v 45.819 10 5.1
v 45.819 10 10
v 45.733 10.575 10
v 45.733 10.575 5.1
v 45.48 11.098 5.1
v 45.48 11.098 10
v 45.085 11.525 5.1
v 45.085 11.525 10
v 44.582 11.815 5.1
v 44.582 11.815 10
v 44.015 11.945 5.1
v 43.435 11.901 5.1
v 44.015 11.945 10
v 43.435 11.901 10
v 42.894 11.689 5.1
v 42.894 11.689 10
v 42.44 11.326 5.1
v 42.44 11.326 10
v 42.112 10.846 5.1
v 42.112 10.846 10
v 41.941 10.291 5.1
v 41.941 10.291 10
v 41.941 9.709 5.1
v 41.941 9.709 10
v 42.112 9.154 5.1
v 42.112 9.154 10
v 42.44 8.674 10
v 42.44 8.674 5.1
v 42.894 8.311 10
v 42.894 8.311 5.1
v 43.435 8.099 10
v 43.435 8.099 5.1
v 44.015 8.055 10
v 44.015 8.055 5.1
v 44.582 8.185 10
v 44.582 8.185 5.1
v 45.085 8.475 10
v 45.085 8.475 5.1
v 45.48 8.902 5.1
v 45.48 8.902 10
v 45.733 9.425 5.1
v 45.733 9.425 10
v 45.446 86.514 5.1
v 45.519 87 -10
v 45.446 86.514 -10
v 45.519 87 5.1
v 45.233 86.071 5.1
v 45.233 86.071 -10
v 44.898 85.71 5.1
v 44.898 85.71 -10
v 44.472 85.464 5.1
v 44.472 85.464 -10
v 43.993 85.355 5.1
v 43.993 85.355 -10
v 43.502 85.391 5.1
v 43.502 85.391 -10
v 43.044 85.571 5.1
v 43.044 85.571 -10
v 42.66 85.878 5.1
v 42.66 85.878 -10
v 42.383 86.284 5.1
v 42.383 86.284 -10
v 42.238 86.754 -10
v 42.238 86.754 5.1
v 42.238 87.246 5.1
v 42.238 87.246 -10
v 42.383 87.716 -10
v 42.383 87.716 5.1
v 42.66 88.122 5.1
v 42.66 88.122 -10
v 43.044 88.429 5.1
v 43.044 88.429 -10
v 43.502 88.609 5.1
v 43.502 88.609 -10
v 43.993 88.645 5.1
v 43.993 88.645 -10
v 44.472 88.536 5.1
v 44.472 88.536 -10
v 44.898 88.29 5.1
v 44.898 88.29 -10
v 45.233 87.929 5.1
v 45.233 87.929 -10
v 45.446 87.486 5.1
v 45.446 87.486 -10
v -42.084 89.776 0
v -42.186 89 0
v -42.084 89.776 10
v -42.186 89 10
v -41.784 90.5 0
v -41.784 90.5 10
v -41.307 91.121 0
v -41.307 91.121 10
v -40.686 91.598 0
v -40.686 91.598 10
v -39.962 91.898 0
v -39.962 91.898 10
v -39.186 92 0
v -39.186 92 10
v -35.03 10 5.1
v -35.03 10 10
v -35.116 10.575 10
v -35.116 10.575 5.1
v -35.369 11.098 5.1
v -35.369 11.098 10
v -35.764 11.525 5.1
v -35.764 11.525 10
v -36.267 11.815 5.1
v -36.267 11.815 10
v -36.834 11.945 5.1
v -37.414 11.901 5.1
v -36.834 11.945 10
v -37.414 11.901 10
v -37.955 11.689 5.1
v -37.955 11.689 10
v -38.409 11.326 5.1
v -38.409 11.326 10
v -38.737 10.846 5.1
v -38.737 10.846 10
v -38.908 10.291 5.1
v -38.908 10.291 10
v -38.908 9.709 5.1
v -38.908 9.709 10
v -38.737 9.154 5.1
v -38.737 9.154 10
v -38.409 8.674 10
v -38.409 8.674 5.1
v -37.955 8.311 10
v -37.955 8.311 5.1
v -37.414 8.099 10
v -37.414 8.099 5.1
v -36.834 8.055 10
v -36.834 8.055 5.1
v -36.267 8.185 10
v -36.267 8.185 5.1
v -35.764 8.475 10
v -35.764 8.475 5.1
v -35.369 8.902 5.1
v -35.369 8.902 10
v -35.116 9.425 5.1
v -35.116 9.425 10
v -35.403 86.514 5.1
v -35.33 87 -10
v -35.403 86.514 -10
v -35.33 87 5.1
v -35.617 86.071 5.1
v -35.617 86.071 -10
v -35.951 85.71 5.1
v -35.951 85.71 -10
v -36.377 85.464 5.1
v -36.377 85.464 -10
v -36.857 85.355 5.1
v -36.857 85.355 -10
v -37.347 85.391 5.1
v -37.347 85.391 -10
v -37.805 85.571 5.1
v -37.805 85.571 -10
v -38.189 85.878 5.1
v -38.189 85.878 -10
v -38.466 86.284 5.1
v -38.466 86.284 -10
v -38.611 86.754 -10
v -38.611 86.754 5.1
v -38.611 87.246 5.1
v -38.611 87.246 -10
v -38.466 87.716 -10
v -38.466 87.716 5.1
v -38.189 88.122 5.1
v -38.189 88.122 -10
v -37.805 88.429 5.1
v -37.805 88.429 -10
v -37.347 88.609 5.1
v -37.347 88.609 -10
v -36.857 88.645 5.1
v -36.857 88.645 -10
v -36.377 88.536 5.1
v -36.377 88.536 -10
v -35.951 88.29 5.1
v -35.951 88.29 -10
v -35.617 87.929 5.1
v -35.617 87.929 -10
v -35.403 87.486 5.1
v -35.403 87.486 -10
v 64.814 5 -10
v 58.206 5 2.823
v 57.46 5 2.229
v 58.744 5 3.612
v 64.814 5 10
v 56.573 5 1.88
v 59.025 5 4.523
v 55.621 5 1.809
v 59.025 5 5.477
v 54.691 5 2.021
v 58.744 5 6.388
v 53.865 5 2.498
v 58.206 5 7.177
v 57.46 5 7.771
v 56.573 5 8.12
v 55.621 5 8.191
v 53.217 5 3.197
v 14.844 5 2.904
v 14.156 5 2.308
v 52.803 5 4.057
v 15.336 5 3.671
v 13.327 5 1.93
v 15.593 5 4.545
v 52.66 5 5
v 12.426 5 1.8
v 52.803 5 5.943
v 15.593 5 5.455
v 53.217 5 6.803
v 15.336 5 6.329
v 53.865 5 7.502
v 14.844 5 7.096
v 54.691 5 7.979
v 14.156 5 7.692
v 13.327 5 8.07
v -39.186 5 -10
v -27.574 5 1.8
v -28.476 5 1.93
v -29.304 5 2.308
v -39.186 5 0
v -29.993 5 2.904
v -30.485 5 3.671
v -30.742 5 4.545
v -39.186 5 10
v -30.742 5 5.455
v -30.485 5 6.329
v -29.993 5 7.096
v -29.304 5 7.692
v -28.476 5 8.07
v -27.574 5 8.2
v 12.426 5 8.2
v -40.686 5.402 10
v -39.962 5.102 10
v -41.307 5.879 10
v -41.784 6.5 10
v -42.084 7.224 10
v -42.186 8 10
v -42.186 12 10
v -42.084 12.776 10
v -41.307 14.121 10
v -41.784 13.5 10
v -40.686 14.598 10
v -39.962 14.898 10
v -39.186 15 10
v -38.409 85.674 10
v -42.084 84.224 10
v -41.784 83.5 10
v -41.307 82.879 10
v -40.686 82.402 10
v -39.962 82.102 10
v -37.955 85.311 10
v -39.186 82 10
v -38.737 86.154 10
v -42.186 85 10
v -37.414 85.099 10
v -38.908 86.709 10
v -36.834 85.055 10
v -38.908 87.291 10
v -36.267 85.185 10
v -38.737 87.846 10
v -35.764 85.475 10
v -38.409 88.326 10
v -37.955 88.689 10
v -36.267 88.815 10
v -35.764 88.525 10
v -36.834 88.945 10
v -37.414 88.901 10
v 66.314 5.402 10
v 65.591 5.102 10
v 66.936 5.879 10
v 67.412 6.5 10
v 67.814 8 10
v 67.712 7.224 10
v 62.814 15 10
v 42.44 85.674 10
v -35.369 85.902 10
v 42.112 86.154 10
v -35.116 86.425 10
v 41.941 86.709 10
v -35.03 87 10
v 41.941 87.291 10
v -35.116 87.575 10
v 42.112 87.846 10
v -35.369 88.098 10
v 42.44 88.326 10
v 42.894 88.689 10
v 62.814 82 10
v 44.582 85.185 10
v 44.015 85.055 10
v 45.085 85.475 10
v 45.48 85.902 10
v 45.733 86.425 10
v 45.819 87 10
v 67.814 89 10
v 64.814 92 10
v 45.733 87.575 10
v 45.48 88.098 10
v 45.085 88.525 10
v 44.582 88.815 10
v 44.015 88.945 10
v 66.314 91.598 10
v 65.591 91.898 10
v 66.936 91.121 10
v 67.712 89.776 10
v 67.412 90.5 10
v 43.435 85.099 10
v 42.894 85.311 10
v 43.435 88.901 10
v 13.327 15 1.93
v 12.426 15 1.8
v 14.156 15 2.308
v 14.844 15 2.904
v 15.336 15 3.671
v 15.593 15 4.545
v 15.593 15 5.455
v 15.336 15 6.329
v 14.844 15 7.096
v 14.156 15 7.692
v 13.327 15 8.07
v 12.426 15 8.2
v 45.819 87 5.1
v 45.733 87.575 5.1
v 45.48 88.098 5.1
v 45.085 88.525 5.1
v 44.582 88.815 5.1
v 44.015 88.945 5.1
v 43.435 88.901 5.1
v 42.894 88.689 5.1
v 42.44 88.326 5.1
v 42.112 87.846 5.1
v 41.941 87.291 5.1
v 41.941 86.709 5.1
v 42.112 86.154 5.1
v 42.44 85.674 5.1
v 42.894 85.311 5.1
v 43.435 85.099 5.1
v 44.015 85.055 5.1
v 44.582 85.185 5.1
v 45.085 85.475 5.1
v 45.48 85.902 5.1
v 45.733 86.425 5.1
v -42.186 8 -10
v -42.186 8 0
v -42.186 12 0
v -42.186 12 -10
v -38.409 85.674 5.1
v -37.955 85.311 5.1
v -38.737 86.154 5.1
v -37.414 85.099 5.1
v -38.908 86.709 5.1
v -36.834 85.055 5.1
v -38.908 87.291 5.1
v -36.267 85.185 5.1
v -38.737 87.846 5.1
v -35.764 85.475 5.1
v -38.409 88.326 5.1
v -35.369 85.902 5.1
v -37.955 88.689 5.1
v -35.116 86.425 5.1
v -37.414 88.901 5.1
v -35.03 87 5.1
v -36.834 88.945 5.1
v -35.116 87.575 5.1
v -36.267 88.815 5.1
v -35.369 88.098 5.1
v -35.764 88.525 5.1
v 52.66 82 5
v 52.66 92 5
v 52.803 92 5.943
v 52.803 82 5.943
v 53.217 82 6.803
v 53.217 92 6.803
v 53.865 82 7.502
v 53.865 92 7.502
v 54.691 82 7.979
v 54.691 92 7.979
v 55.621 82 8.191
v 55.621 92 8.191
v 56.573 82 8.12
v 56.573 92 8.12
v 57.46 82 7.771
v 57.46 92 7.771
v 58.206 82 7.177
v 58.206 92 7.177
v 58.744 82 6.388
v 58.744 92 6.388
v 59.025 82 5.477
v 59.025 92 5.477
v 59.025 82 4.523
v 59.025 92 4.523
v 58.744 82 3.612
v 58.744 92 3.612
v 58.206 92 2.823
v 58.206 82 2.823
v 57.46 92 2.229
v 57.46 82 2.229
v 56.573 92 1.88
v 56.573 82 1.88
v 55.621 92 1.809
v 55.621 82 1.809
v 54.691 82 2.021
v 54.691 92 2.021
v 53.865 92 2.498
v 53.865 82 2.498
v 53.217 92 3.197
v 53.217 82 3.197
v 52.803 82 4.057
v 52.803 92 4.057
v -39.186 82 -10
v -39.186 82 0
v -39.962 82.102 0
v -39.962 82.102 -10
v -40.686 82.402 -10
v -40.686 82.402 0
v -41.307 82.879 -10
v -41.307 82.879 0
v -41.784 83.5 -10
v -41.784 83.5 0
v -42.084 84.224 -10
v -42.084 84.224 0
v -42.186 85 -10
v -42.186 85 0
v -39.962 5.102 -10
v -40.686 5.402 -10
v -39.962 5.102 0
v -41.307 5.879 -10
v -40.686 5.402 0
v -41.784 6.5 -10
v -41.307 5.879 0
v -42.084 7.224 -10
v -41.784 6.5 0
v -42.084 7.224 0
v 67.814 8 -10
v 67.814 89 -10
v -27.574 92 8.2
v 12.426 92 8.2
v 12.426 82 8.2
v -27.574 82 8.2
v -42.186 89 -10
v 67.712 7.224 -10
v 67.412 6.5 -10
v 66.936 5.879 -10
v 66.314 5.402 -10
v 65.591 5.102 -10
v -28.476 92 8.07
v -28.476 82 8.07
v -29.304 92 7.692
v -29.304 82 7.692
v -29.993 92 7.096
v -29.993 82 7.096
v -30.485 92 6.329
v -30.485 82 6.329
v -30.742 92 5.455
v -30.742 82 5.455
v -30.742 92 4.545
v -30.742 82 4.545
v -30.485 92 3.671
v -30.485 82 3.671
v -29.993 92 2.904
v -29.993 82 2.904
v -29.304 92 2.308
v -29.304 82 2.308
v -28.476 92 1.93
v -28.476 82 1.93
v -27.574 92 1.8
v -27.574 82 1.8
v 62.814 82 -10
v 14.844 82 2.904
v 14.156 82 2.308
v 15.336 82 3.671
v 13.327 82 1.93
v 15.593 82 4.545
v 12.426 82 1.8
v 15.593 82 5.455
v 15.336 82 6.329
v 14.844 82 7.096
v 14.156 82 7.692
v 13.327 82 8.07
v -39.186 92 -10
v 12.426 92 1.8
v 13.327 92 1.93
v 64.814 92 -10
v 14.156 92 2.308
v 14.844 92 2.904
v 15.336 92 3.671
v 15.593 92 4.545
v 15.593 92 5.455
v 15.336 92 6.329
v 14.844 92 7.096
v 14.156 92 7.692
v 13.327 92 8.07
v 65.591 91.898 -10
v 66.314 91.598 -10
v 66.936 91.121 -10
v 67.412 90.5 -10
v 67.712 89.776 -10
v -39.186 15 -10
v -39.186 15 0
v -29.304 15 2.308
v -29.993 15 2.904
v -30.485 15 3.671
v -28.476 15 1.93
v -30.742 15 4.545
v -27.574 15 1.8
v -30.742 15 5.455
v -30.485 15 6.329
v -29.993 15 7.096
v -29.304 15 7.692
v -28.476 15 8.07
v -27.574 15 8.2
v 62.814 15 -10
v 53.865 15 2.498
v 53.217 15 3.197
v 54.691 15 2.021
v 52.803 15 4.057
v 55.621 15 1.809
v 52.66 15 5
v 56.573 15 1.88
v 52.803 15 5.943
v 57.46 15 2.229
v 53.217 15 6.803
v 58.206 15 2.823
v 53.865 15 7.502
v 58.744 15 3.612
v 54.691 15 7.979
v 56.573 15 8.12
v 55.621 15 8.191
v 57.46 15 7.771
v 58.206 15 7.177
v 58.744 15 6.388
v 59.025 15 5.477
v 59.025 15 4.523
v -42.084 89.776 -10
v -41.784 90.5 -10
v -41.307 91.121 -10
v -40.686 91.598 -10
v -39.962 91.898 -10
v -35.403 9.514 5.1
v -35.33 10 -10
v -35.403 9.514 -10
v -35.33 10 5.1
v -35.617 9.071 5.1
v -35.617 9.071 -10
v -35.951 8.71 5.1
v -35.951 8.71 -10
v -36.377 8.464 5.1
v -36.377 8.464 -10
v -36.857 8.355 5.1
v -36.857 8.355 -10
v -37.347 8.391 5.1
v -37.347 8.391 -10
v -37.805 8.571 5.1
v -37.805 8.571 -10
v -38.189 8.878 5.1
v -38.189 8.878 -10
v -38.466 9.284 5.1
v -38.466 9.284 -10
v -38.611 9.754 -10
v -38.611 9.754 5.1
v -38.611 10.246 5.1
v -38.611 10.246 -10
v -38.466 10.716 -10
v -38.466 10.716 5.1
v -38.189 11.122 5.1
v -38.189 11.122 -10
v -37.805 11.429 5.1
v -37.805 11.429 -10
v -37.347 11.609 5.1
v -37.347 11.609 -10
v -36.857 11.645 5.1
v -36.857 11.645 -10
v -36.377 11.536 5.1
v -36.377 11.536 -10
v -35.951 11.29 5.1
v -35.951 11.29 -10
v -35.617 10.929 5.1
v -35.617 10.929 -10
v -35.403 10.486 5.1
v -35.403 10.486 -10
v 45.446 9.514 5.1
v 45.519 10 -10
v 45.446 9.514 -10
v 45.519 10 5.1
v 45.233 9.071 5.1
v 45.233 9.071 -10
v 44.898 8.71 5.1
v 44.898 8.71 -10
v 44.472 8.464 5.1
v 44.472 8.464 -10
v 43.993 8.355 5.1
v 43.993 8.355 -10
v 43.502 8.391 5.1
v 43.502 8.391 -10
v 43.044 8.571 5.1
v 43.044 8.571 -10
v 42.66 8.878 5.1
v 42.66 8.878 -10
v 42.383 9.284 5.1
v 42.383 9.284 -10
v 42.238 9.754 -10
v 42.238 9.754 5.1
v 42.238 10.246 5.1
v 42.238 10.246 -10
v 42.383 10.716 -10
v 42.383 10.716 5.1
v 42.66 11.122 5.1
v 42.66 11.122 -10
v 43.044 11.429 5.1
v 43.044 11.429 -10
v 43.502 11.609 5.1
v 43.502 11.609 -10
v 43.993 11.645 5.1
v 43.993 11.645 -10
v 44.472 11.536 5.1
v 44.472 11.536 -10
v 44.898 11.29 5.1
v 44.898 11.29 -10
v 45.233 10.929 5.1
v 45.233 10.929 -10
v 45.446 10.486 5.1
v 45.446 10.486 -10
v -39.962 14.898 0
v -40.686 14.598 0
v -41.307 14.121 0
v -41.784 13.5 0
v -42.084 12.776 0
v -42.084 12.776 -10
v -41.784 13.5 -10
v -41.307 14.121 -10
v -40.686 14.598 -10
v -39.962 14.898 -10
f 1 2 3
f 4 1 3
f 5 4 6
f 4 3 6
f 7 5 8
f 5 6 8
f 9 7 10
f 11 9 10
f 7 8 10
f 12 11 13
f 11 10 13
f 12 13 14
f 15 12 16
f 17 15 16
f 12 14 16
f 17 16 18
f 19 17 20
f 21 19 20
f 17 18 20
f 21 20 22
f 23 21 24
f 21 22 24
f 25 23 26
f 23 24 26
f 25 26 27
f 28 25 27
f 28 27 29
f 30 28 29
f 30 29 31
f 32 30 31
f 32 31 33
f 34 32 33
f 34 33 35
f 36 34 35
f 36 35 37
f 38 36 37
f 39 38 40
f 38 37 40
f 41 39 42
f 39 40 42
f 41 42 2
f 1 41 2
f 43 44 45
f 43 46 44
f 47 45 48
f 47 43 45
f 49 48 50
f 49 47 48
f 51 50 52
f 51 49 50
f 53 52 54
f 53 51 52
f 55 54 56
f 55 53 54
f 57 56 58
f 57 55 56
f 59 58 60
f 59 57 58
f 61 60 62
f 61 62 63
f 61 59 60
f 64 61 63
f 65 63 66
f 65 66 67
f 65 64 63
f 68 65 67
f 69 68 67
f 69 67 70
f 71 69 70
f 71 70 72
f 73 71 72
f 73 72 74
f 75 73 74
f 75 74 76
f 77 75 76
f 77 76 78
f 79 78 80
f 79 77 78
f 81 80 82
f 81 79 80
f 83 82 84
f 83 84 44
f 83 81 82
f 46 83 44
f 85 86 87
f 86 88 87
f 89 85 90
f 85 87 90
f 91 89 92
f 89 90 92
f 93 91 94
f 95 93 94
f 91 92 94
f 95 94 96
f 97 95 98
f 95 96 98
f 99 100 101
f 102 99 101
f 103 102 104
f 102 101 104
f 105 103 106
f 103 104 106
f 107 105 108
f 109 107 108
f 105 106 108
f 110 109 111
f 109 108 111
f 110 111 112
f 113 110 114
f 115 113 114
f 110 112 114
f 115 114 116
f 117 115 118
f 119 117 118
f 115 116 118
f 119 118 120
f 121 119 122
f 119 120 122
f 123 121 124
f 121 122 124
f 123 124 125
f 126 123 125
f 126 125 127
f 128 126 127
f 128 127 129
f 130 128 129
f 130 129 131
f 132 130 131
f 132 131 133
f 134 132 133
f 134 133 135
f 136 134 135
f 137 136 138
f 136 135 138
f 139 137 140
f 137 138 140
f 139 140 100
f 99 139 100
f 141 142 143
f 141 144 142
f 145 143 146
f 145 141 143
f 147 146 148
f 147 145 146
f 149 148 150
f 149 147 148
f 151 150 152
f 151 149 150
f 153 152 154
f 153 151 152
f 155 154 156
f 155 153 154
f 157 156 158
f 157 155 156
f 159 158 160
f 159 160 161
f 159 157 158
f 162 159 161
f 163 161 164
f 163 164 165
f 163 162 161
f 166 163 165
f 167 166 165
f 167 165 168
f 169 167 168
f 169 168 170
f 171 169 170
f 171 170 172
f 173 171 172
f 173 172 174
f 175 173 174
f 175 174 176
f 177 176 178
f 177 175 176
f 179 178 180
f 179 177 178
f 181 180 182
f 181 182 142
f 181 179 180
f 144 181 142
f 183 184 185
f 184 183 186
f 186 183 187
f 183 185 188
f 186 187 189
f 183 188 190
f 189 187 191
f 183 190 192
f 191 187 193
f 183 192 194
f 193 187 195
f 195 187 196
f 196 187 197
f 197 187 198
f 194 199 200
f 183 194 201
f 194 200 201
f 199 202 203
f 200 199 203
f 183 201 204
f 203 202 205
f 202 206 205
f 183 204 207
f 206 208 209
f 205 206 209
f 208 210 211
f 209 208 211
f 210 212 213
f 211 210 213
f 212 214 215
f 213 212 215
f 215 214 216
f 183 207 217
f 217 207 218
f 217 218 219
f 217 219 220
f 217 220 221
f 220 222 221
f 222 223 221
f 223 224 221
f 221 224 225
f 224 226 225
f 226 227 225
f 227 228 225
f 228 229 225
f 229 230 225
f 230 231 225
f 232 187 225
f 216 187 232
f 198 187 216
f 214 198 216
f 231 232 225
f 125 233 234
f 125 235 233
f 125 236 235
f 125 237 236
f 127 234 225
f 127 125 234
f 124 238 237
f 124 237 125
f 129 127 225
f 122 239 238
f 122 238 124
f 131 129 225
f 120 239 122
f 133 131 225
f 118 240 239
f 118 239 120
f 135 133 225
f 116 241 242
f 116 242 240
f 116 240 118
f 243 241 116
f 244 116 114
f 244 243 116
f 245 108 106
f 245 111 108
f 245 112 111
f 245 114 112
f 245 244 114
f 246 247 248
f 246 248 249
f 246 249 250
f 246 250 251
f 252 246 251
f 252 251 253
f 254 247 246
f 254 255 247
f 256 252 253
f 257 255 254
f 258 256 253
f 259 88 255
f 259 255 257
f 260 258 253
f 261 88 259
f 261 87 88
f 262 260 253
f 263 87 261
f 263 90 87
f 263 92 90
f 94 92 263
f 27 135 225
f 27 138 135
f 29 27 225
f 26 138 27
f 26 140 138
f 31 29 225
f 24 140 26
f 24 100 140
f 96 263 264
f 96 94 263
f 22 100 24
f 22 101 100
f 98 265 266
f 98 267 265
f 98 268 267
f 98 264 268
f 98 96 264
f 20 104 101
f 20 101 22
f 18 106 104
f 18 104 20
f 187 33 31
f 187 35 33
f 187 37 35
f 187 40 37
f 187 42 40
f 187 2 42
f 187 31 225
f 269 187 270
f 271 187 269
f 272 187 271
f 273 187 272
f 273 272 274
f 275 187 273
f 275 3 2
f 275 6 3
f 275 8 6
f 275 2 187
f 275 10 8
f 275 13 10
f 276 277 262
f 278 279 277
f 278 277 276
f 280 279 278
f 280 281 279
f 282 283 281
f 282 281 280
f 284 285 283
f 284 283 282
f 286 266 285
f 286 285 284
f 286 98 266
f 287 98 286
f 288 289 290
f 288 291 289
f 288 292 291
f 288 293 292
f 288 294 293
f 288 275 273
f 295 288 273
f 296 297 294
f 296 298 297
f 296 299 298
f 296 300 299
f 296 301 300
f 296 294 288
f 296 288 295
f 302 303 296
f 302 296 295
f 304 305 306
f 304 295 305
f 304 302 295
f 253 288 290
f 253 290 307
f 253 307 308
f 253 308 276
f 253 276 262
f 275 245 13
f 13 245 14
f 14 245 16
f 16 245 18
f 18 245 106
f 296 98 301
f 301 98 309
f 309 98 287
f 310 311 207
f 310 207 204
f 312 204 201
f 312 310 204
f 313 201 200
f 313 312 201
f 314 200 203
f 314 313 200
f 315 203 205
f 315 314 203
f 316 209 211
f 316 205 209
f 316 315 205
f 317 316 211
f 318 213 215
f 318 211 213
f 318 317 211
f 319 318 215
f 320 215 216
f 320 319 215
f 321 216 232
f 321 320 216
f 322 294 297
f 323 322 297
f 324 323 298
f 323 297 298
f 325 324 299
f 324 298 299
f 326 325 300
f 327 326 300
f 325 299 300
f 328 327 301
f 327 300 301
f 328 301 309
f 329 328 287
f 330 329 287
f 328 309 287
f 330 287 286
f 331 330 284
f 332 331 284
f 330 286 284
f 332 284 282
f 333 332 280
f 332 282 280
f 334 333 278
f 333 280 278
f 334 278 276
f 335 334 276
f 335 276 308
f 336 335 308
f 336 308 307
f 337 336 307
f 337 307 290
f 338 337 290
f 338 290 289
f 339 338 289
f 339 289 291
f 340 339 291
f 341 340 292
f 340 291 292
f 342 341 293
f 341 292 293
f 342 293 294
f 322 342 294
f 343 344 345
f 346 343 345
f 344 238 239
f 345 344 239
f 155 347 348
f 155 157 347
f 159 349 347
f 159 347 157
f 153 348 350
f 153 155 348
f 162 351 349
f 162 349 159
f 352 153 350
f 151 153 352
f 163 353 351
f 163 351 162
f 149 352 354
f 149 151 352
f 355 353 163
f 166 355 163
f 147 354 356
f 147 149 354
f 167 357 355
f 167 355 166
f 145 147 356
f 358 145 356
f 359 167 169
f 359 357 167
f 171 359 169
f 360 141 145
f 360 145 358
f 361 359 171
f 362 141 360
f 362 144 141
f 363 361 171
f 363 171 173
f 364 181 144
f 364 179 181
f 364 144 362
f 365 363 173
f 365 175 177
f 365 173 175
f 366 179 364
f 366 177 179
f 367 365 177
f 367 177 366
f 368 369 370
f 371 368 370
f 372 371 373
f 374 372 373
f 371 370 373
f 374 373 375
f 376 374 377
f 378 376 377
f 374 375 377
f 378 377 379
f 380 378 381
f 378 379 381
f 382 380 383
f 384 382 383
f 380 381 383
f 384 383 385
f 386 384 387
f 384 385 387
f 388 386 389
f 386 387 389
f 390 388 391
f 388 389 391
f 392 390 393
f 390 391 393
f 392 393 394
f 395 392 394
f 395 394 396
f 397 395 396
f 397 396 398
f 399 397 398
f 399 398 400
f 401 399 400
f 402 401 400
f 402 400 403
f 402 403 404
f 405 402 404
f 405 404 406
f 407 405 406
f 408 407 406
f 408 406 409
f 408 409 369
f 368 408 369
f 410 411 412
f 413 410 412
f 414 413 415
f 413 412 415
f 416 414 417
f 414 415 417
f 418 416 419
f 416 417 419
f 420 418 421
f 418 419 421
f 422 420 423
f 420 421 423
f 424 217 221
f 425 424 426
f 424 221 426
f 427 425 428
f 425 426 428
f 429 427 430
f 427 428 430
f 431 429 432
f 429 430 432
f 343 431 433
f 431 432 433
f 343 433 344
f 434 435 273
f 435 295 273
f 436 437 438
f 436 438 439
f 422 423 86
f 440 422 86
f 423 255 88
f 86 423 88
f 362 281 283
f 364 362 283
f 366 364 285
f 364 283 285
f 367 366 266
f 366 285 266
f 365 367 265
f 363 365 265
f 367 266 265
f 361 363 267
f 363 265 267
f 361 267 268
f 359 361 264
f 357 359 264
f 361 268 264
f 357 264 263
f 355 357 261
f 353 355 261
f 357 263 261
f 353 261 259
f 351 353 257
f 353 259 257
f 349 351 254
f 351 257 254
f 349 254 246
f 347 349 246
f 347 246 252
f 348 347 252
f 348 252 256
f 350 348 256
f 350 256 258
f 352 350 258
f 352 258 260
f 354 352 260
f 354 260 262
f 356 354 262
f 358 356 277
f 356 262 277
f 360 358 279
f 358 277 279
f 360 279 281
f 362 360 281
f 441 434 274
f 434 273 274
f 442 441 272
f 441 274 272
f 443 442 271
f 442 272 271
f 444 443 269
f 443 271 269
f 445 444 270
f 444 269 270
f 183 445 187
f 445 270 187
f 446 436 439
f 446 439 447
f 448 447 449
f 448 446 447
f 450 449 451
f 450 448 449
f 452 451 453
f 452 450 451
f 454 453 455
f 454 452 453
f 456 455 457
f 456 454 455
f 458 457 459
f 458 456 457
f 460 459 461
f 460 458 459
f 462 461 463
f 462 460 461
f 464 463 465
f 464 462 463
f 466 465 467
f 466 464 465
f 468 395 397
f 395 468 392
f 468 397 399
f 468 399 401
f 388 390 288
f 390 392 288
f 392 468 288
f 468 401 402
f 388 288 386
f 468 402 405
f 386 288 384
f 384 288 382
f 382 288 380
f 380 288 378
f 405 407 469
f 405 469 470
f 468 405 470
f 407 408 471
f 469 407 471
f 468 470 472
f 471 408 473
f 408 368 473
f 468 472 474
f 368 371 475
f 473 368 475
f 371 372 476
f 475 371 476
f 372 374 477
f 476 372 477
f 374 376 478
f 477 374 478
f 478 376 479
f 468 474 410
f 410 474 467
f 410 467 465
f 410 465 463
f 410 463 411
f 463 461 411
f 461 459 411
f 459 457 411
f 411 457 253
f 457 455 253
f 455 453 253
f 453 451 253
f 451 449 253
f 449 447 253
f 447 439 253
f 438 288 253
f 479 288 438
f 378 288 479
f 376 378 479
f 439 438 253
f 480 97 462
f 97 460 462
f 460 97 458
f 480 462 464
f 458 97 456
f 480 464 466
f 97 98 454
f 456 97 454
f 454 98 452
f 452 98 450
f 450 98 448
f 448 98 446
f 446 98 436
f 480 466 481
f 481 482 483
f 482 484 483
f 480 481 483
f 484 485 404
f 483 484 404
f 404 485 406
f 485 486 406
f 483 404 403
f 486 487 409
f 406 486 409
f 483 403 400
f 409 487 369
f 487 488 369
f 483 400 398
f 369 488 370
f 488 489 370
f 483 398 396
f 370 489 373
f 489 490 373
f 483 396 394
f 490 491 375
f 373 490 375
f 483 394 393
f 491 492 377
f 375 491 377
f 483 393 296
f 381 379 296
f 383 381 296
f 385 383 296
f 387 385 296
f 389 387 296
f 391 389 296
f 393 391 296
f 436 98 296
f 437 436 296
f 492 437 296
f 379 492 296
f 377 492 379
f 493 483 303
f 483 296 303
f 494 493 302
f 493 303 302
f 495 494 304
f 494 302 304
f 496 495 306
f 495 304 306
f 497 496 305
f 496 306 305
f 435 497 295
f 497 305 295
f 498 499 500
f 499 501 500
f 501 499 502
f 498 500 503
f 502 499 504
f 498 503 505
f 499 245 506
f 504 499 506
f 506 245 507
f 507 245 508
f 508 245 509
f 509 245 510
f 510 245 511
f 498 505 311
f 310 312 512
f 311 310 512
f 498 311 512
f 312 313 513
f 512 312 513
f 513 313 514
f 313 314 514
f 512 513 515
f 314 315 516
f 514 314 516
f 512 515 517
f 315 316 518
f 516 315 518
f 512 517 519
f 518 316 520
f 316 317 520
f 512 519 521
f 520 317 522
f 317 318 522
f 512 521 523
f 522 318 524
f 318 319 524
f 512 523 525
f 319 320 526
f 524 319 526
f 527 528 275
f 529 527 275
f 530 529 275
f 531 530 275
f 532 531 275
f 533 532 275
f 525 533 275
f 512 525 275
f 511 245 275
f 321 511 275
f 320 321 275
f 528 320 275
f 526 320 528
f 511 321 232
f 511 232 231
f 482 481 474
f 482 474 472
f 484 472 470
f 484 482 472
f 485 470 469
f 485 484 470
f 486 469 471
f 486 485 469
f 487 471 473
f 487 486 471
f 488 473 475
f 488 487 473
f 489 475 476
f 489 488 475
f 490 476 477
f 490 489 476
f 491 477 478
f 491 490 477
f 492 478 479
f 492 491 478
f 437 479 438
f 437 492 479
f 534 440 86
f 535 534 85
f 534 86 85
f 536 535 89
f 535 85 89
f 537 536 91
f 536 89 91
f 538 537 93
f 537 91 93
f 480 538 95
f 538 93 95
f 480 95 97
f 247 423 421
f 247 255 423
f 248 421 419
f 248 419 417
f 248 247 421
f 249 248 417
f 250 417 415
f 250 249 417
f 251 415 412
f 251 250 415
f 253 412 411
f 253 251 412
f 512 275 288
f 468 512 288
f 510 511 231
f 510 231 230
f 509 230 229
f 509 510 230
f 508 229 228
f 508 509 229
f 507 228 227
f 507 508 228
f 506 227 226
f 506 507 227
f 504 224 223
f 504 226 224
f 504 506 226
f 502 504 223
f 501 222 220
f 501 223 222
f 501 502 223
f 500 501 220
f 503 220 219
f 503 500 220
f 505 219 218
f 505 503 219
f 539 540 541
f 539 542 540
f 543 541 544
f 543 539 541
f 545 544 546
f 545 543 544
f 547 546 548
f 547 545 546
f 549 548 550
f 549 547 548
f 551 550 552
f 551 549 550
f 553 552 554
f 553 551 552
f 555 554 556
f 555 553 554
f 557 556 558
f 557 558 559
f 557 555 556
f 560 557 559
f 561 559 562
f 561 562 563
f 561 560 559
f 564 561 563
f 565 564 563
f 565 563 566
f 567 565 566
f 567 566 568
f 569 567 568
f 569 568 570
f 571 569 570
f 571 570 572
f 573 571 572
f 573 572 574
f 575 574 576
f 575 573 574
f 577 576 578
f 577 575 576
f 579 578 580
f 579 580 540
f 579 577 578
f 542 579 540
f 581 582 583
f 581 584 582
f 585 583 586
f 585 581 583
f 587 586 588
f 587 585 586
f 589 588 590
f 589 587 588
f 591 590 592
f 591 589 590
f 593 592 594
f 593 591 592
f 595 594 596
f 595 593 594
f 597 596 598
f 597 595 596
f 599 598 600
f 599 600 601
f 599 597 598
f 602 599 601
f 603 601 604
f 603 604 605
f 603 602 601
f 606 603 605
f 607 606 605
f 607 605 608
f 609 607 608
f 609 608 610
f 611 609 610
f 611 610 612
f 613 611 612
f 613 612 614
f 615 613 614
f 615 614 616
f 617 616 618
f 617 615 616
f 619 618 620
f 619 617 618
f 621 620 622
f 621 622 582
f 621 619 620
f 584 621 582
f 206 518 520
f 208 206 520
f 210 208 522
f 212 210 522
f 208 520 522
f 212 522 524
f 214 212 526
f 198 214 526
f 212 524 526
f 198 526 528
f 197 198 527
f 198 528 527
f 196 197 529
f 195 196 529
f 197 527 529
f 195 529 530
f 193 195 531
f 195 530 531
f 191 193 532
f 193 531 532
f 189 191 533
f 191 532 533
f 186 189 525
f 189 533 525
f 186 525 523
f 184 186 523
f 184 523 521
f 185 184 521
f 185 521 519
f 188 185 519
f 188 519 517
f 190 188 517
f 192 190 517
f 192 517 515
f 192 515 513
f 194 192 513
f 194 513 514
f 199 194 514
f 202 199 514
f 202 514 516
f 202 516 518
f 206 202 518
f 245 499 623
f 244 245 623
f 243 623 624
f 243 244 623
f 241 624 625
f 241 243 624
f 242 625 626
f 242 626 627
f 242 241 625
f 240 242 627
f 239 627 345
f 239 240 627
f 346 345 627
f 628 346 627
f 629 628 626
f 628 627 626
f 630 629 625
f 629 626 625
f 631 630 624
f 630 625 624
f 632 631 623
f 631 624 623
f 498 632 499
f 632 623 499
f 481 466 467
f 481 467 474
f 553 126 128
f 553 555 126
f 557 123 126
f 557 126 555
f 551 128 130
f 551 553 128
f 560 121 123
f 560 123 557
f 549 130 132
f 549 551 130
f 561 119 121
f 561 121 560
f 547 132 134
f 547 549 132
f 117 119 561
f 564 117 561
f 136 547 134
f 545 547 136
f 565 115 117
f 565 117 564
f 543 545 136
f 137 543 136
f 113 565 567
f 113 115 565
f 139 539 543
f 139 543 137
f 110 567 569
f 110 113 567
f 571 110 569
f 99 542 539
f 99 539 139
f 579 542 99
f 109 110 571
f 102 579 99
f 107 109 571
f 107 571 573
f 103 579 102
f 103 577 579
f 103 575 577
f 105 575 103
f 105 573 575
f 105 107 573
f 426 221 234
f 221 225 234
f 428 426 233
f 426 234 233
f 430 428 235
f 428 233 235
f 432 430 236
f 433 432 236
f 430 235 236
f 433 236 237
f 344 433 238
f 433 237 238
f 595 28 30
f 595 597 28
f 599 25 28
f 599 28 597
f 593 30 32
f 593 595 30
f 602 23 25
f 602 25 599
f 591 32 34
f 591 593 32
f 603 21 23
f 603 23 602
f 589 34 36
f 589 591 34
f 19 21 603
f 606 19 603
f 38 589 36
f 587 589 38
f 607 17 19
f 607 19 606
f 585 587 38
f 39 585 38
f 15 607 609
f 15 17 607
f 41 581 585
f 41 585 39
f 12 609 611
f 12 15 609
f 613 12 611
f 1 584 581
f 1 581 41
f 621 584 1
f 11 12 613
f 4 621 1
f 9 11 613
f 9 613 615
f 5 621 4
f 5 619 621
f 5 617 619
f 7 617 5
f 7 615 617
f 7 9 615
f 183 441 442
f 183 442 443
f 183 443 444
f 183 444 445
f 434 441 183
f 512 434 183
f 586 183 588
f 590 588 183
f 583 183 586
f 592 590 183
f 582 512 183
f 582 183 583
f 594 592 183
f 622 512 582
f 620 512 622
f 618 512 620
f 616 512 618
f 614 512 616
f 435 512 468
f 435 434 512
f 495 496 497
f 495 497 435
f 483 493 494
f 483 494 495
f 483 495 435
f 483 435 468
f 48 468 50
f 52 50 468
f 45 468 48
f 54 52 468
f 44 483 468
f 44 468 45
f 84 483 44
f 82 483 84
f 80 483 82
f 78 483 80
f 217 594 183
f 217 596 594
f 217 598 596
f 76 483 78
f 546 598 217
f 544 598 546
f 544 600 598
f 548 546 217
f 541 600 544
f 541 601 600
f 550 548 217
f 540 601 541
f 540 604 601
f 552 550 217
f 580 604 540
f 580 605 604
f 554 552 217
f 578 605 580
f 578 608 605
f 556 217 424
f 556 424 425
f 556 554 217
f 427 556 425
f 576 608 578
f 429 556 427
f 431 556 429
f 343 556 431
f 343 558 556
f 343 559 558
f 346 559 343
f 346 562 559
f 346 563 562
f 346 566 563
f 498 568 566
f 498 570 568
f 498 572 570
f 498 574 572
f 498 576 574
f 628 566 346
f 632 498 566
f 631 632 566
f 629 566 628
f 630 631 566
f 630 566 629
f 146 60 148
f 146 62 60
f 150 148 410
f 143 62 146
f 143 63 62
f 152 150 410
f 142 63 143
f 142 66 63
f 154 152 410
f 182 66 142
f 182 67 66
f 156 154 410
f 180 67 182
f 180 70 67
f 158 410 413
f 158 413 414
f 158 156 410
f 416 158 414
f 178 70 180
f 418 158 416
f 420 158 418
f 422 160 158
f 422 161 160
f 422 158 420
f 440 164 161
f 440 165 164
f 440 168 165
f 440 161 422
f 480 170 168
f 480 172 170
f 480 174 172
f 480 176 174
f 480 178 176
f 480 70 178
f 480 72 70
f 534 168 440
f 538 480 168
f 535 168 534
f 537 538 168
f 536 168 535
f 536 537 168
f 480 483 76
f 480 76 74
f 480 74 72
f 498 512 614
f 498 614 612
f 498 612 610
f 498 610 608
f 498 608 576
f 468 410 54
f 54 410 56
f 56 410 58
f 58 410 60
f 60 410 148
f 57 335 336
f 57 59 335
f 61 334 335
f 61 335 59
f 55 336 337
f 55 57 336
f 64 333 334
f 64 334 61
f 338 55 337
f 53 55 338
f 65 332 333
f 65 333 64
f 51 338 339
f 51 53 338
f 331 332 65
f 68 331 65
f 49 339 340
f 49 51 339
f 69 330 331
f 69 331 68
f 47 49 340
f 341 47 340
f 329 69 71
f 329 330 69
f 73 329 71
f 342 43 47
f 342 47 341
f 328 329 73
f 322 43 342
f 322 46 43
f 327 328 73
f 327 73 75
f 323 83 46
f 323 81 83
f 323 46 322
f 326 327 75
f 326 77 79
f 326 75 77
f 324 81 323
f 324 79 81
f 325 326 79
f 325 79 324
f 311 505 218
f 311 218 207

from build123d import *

# Parameters (mm, degrees)
CROQUIS1_W              = 105
CROQUIS1_H              = 10
CROQUIS1_W_2            = 5
CROQUIS1_H_2            = 33.5
SALIENTE_EXTRUIR1_DEPTH = 10
CROQUIS2_R              = 3.2
CORTAR_EXTRUIR1_DEPTH   = 111.759992767
CROQUIS3_R              = 1.95
CORTAR_EXTRUIR2_DEPTH   = 4.9
CROQUIS4_R              = 1.65
CORTAR_EXTRUIR3_DEPTH   = 115.406232338
REDONDEO1_R             = 3
CROQUIS7_R              = 1.65
SALIENTE_EXTRUIR2_DEPTH = 10


with BuildPart() as part:
    # Croquis1 → Saliente-Extruir1 (new body)
    with BuildSketch(Plane.XY):
        with Locations((10.314275766, 87)):
            Rectangle(CROQUIS1_W, CROQUIS1_H)
        with Locations((65.314275766, 87)):
            Rectangle(CROQUIS1_W_2, CROQUIS1_H)
        with Locations((65.314275766, 65.25)):
            Rectangle(CROQUIS1_W_2, CROQUIS1_H_2)
        with Locations((65.314275766, 31.75)):
            Rectangle(CROQUIS1_W_2, CROQUIS1_H_2)
        with Locations((65.314275766, 10)):
            Rectangle(CROQUIS1_W_2, CROQUIS1_H)
        with Locations((10.314275766, 10)):
            Rectangle(CROQUIS1_W, CROQUIS1_H)
    extrude(amount=SALIENTE_EXTRUIR1_DEPTH)

    # Croquis2 → Cortar-Extruir1 (cut, through all)
    with BuildSketch(Plane(origin=(0, 92, 0), x_dir=(1, 0, 0), z_dir=(0, 1, 0))):
        with Locations(Location((55.860494793, -5, 0), (0, 0, 180))):
            Circle(CROQUIS2_R)
        with BuildLine():
            Line((12.425652442, -8.2), (-27.574347558, -8.2))
            ThreePointArc((-27.574347558, -8.2), (-30.774347558, -5), (-27.574347558, -1.8))
            Line((-27.574347558, -1.8), (12.425652442, -1.8))
            ThreePointArc((12.425652442, -1.8), (15.625652442, -5), (12.425652442, -8.2))
        make_face()
    extrude(amount=-CORTAR_EXTRUIR1_DEPTH, mode=Mode.SUBTRACT)

    # Croquis3 → Cortar-Extruir2 (cut)
    with BuildSketch(Plane.XY.offset(10)):
        with Locations((-36.979834841, 87)):
            Circle(CROQUIS3_R)
        with Locations((-36.979834841, 10)):
            Circle(CROQUIS3_R)
        with Locations((43.869300962, 10)):
            Circle(CROQUIS3_R)
        with Locations((43.869300962, 87)):
            Circle(CROQUIS3_R)
    extrude(amount=-CORTAR_EXTRUIR2_DEPTH, mode=Mode.SUBTRACT)

    # Croquis4 → Cortar-Extruir3 (cut, through all)
    with BuildSketch(Plane.XY.offset(5.1)):
        with Locations((-36.979834841, 87)):
            Circle(CROQUIS4_R)
        with Locations((-36.979834841, 10)):
            Circle(CROQUIS4_R)
        with Locations((43.869300962, 10)):
            Circle(CROQUIS4_R)
        with Locations((43.869300962, 87)):
            Circle(CROQUIS4_R)
    extrude(amount=-CORTAR_EXTRUIR3_DEPTH, mode=Mode.SUBTRACT)

    # Redondeo1
    redondeo1_edges = [part.edges().sort_by_distance(p)[0] for p in [
        (-42.185724234, 82, 5),
        (-42.185724234, 92, 5),
        (67.814275766, 92, 5),
        (67.814275766, 5, 5),
        (-42.185724234, 5, 5),
        (-42.185724234, 15, 5),
    ]]
    fillet(redondeo1_edges, radius=REDONDEO1_R)

    # Croquis7 → Saliente-Extruir2 (add)
    with BuildSketch(Plane(origin=(0, 0, 0), x_dir=(-1, 0, 0), z_dir=(0, 0, -1))):
        with BuildLine():
            Line((39.185724234, 92), (-64.814275766, 92))
            ThreePointArc((-64.814275766, 92), (-66.93559611, 91.121320344), (-67.814275766, 89))
            Line((-67.814275766, 89), (-67.814275766, 8))
            ThreePointArc((-67.814275766, 8), (-66.93559611, 5.878679656), (-64.814275766, 5))
            Line((-64.814275766, 5), (39.185724234, 5))
            ThreePointArc((39.185724234, 5), (41.307044577, 5.878679656), (42.185724234, 8))
            Line((42.185724234, 8), (42.185724234, 12))
            ThreePointArc((42.185724234, 12), (41.307044577, 14.121320344), (39.185724234, 15))
            Line((39.185724234, 15), (-62.814275766, 15))
            Line((-62.814275766, 15), (-62.814275766, 82))
            Line((-62.814275766, 82), (39.185724234, 82))
            ThreePointArc((39.185724234, 82), (41.307044577, 82.878679656), (42.185724234, 85))
            Line((42.185724234, 85), (42.185724234, 89))
            ThreePointArc((42.185724234, 89), (41.307044577, 91.121320344), (39.185724234, 92))
        make_face()
        with Locations(Location((36.979834841, 87, 0), (0, 0, 180))):
            Circle(CROQUIS7_R, mode=Mode.SUBTRACT)
        with Locations(Location((36.979834841, 10, 0), (0, 0, 180))):
            Circle(CROQUIS7_R, mode=Mode.SUBTRACT)
        with Locations(Location((-43.869300962, 10, 0), (0, 0, 180))):
            Circle(CROQUIS7_R, mode=Mode.SUBTRACT)
        with Locations(Location((-43.869300962, 87, 0), (0, 0, 180))):
            Circle(CROQUIS7_R, mode=Mode.SUBTRACT)
    extrude(amount=SALIENTE_EXTRUIR2_DEPTH)


solid = part.part
